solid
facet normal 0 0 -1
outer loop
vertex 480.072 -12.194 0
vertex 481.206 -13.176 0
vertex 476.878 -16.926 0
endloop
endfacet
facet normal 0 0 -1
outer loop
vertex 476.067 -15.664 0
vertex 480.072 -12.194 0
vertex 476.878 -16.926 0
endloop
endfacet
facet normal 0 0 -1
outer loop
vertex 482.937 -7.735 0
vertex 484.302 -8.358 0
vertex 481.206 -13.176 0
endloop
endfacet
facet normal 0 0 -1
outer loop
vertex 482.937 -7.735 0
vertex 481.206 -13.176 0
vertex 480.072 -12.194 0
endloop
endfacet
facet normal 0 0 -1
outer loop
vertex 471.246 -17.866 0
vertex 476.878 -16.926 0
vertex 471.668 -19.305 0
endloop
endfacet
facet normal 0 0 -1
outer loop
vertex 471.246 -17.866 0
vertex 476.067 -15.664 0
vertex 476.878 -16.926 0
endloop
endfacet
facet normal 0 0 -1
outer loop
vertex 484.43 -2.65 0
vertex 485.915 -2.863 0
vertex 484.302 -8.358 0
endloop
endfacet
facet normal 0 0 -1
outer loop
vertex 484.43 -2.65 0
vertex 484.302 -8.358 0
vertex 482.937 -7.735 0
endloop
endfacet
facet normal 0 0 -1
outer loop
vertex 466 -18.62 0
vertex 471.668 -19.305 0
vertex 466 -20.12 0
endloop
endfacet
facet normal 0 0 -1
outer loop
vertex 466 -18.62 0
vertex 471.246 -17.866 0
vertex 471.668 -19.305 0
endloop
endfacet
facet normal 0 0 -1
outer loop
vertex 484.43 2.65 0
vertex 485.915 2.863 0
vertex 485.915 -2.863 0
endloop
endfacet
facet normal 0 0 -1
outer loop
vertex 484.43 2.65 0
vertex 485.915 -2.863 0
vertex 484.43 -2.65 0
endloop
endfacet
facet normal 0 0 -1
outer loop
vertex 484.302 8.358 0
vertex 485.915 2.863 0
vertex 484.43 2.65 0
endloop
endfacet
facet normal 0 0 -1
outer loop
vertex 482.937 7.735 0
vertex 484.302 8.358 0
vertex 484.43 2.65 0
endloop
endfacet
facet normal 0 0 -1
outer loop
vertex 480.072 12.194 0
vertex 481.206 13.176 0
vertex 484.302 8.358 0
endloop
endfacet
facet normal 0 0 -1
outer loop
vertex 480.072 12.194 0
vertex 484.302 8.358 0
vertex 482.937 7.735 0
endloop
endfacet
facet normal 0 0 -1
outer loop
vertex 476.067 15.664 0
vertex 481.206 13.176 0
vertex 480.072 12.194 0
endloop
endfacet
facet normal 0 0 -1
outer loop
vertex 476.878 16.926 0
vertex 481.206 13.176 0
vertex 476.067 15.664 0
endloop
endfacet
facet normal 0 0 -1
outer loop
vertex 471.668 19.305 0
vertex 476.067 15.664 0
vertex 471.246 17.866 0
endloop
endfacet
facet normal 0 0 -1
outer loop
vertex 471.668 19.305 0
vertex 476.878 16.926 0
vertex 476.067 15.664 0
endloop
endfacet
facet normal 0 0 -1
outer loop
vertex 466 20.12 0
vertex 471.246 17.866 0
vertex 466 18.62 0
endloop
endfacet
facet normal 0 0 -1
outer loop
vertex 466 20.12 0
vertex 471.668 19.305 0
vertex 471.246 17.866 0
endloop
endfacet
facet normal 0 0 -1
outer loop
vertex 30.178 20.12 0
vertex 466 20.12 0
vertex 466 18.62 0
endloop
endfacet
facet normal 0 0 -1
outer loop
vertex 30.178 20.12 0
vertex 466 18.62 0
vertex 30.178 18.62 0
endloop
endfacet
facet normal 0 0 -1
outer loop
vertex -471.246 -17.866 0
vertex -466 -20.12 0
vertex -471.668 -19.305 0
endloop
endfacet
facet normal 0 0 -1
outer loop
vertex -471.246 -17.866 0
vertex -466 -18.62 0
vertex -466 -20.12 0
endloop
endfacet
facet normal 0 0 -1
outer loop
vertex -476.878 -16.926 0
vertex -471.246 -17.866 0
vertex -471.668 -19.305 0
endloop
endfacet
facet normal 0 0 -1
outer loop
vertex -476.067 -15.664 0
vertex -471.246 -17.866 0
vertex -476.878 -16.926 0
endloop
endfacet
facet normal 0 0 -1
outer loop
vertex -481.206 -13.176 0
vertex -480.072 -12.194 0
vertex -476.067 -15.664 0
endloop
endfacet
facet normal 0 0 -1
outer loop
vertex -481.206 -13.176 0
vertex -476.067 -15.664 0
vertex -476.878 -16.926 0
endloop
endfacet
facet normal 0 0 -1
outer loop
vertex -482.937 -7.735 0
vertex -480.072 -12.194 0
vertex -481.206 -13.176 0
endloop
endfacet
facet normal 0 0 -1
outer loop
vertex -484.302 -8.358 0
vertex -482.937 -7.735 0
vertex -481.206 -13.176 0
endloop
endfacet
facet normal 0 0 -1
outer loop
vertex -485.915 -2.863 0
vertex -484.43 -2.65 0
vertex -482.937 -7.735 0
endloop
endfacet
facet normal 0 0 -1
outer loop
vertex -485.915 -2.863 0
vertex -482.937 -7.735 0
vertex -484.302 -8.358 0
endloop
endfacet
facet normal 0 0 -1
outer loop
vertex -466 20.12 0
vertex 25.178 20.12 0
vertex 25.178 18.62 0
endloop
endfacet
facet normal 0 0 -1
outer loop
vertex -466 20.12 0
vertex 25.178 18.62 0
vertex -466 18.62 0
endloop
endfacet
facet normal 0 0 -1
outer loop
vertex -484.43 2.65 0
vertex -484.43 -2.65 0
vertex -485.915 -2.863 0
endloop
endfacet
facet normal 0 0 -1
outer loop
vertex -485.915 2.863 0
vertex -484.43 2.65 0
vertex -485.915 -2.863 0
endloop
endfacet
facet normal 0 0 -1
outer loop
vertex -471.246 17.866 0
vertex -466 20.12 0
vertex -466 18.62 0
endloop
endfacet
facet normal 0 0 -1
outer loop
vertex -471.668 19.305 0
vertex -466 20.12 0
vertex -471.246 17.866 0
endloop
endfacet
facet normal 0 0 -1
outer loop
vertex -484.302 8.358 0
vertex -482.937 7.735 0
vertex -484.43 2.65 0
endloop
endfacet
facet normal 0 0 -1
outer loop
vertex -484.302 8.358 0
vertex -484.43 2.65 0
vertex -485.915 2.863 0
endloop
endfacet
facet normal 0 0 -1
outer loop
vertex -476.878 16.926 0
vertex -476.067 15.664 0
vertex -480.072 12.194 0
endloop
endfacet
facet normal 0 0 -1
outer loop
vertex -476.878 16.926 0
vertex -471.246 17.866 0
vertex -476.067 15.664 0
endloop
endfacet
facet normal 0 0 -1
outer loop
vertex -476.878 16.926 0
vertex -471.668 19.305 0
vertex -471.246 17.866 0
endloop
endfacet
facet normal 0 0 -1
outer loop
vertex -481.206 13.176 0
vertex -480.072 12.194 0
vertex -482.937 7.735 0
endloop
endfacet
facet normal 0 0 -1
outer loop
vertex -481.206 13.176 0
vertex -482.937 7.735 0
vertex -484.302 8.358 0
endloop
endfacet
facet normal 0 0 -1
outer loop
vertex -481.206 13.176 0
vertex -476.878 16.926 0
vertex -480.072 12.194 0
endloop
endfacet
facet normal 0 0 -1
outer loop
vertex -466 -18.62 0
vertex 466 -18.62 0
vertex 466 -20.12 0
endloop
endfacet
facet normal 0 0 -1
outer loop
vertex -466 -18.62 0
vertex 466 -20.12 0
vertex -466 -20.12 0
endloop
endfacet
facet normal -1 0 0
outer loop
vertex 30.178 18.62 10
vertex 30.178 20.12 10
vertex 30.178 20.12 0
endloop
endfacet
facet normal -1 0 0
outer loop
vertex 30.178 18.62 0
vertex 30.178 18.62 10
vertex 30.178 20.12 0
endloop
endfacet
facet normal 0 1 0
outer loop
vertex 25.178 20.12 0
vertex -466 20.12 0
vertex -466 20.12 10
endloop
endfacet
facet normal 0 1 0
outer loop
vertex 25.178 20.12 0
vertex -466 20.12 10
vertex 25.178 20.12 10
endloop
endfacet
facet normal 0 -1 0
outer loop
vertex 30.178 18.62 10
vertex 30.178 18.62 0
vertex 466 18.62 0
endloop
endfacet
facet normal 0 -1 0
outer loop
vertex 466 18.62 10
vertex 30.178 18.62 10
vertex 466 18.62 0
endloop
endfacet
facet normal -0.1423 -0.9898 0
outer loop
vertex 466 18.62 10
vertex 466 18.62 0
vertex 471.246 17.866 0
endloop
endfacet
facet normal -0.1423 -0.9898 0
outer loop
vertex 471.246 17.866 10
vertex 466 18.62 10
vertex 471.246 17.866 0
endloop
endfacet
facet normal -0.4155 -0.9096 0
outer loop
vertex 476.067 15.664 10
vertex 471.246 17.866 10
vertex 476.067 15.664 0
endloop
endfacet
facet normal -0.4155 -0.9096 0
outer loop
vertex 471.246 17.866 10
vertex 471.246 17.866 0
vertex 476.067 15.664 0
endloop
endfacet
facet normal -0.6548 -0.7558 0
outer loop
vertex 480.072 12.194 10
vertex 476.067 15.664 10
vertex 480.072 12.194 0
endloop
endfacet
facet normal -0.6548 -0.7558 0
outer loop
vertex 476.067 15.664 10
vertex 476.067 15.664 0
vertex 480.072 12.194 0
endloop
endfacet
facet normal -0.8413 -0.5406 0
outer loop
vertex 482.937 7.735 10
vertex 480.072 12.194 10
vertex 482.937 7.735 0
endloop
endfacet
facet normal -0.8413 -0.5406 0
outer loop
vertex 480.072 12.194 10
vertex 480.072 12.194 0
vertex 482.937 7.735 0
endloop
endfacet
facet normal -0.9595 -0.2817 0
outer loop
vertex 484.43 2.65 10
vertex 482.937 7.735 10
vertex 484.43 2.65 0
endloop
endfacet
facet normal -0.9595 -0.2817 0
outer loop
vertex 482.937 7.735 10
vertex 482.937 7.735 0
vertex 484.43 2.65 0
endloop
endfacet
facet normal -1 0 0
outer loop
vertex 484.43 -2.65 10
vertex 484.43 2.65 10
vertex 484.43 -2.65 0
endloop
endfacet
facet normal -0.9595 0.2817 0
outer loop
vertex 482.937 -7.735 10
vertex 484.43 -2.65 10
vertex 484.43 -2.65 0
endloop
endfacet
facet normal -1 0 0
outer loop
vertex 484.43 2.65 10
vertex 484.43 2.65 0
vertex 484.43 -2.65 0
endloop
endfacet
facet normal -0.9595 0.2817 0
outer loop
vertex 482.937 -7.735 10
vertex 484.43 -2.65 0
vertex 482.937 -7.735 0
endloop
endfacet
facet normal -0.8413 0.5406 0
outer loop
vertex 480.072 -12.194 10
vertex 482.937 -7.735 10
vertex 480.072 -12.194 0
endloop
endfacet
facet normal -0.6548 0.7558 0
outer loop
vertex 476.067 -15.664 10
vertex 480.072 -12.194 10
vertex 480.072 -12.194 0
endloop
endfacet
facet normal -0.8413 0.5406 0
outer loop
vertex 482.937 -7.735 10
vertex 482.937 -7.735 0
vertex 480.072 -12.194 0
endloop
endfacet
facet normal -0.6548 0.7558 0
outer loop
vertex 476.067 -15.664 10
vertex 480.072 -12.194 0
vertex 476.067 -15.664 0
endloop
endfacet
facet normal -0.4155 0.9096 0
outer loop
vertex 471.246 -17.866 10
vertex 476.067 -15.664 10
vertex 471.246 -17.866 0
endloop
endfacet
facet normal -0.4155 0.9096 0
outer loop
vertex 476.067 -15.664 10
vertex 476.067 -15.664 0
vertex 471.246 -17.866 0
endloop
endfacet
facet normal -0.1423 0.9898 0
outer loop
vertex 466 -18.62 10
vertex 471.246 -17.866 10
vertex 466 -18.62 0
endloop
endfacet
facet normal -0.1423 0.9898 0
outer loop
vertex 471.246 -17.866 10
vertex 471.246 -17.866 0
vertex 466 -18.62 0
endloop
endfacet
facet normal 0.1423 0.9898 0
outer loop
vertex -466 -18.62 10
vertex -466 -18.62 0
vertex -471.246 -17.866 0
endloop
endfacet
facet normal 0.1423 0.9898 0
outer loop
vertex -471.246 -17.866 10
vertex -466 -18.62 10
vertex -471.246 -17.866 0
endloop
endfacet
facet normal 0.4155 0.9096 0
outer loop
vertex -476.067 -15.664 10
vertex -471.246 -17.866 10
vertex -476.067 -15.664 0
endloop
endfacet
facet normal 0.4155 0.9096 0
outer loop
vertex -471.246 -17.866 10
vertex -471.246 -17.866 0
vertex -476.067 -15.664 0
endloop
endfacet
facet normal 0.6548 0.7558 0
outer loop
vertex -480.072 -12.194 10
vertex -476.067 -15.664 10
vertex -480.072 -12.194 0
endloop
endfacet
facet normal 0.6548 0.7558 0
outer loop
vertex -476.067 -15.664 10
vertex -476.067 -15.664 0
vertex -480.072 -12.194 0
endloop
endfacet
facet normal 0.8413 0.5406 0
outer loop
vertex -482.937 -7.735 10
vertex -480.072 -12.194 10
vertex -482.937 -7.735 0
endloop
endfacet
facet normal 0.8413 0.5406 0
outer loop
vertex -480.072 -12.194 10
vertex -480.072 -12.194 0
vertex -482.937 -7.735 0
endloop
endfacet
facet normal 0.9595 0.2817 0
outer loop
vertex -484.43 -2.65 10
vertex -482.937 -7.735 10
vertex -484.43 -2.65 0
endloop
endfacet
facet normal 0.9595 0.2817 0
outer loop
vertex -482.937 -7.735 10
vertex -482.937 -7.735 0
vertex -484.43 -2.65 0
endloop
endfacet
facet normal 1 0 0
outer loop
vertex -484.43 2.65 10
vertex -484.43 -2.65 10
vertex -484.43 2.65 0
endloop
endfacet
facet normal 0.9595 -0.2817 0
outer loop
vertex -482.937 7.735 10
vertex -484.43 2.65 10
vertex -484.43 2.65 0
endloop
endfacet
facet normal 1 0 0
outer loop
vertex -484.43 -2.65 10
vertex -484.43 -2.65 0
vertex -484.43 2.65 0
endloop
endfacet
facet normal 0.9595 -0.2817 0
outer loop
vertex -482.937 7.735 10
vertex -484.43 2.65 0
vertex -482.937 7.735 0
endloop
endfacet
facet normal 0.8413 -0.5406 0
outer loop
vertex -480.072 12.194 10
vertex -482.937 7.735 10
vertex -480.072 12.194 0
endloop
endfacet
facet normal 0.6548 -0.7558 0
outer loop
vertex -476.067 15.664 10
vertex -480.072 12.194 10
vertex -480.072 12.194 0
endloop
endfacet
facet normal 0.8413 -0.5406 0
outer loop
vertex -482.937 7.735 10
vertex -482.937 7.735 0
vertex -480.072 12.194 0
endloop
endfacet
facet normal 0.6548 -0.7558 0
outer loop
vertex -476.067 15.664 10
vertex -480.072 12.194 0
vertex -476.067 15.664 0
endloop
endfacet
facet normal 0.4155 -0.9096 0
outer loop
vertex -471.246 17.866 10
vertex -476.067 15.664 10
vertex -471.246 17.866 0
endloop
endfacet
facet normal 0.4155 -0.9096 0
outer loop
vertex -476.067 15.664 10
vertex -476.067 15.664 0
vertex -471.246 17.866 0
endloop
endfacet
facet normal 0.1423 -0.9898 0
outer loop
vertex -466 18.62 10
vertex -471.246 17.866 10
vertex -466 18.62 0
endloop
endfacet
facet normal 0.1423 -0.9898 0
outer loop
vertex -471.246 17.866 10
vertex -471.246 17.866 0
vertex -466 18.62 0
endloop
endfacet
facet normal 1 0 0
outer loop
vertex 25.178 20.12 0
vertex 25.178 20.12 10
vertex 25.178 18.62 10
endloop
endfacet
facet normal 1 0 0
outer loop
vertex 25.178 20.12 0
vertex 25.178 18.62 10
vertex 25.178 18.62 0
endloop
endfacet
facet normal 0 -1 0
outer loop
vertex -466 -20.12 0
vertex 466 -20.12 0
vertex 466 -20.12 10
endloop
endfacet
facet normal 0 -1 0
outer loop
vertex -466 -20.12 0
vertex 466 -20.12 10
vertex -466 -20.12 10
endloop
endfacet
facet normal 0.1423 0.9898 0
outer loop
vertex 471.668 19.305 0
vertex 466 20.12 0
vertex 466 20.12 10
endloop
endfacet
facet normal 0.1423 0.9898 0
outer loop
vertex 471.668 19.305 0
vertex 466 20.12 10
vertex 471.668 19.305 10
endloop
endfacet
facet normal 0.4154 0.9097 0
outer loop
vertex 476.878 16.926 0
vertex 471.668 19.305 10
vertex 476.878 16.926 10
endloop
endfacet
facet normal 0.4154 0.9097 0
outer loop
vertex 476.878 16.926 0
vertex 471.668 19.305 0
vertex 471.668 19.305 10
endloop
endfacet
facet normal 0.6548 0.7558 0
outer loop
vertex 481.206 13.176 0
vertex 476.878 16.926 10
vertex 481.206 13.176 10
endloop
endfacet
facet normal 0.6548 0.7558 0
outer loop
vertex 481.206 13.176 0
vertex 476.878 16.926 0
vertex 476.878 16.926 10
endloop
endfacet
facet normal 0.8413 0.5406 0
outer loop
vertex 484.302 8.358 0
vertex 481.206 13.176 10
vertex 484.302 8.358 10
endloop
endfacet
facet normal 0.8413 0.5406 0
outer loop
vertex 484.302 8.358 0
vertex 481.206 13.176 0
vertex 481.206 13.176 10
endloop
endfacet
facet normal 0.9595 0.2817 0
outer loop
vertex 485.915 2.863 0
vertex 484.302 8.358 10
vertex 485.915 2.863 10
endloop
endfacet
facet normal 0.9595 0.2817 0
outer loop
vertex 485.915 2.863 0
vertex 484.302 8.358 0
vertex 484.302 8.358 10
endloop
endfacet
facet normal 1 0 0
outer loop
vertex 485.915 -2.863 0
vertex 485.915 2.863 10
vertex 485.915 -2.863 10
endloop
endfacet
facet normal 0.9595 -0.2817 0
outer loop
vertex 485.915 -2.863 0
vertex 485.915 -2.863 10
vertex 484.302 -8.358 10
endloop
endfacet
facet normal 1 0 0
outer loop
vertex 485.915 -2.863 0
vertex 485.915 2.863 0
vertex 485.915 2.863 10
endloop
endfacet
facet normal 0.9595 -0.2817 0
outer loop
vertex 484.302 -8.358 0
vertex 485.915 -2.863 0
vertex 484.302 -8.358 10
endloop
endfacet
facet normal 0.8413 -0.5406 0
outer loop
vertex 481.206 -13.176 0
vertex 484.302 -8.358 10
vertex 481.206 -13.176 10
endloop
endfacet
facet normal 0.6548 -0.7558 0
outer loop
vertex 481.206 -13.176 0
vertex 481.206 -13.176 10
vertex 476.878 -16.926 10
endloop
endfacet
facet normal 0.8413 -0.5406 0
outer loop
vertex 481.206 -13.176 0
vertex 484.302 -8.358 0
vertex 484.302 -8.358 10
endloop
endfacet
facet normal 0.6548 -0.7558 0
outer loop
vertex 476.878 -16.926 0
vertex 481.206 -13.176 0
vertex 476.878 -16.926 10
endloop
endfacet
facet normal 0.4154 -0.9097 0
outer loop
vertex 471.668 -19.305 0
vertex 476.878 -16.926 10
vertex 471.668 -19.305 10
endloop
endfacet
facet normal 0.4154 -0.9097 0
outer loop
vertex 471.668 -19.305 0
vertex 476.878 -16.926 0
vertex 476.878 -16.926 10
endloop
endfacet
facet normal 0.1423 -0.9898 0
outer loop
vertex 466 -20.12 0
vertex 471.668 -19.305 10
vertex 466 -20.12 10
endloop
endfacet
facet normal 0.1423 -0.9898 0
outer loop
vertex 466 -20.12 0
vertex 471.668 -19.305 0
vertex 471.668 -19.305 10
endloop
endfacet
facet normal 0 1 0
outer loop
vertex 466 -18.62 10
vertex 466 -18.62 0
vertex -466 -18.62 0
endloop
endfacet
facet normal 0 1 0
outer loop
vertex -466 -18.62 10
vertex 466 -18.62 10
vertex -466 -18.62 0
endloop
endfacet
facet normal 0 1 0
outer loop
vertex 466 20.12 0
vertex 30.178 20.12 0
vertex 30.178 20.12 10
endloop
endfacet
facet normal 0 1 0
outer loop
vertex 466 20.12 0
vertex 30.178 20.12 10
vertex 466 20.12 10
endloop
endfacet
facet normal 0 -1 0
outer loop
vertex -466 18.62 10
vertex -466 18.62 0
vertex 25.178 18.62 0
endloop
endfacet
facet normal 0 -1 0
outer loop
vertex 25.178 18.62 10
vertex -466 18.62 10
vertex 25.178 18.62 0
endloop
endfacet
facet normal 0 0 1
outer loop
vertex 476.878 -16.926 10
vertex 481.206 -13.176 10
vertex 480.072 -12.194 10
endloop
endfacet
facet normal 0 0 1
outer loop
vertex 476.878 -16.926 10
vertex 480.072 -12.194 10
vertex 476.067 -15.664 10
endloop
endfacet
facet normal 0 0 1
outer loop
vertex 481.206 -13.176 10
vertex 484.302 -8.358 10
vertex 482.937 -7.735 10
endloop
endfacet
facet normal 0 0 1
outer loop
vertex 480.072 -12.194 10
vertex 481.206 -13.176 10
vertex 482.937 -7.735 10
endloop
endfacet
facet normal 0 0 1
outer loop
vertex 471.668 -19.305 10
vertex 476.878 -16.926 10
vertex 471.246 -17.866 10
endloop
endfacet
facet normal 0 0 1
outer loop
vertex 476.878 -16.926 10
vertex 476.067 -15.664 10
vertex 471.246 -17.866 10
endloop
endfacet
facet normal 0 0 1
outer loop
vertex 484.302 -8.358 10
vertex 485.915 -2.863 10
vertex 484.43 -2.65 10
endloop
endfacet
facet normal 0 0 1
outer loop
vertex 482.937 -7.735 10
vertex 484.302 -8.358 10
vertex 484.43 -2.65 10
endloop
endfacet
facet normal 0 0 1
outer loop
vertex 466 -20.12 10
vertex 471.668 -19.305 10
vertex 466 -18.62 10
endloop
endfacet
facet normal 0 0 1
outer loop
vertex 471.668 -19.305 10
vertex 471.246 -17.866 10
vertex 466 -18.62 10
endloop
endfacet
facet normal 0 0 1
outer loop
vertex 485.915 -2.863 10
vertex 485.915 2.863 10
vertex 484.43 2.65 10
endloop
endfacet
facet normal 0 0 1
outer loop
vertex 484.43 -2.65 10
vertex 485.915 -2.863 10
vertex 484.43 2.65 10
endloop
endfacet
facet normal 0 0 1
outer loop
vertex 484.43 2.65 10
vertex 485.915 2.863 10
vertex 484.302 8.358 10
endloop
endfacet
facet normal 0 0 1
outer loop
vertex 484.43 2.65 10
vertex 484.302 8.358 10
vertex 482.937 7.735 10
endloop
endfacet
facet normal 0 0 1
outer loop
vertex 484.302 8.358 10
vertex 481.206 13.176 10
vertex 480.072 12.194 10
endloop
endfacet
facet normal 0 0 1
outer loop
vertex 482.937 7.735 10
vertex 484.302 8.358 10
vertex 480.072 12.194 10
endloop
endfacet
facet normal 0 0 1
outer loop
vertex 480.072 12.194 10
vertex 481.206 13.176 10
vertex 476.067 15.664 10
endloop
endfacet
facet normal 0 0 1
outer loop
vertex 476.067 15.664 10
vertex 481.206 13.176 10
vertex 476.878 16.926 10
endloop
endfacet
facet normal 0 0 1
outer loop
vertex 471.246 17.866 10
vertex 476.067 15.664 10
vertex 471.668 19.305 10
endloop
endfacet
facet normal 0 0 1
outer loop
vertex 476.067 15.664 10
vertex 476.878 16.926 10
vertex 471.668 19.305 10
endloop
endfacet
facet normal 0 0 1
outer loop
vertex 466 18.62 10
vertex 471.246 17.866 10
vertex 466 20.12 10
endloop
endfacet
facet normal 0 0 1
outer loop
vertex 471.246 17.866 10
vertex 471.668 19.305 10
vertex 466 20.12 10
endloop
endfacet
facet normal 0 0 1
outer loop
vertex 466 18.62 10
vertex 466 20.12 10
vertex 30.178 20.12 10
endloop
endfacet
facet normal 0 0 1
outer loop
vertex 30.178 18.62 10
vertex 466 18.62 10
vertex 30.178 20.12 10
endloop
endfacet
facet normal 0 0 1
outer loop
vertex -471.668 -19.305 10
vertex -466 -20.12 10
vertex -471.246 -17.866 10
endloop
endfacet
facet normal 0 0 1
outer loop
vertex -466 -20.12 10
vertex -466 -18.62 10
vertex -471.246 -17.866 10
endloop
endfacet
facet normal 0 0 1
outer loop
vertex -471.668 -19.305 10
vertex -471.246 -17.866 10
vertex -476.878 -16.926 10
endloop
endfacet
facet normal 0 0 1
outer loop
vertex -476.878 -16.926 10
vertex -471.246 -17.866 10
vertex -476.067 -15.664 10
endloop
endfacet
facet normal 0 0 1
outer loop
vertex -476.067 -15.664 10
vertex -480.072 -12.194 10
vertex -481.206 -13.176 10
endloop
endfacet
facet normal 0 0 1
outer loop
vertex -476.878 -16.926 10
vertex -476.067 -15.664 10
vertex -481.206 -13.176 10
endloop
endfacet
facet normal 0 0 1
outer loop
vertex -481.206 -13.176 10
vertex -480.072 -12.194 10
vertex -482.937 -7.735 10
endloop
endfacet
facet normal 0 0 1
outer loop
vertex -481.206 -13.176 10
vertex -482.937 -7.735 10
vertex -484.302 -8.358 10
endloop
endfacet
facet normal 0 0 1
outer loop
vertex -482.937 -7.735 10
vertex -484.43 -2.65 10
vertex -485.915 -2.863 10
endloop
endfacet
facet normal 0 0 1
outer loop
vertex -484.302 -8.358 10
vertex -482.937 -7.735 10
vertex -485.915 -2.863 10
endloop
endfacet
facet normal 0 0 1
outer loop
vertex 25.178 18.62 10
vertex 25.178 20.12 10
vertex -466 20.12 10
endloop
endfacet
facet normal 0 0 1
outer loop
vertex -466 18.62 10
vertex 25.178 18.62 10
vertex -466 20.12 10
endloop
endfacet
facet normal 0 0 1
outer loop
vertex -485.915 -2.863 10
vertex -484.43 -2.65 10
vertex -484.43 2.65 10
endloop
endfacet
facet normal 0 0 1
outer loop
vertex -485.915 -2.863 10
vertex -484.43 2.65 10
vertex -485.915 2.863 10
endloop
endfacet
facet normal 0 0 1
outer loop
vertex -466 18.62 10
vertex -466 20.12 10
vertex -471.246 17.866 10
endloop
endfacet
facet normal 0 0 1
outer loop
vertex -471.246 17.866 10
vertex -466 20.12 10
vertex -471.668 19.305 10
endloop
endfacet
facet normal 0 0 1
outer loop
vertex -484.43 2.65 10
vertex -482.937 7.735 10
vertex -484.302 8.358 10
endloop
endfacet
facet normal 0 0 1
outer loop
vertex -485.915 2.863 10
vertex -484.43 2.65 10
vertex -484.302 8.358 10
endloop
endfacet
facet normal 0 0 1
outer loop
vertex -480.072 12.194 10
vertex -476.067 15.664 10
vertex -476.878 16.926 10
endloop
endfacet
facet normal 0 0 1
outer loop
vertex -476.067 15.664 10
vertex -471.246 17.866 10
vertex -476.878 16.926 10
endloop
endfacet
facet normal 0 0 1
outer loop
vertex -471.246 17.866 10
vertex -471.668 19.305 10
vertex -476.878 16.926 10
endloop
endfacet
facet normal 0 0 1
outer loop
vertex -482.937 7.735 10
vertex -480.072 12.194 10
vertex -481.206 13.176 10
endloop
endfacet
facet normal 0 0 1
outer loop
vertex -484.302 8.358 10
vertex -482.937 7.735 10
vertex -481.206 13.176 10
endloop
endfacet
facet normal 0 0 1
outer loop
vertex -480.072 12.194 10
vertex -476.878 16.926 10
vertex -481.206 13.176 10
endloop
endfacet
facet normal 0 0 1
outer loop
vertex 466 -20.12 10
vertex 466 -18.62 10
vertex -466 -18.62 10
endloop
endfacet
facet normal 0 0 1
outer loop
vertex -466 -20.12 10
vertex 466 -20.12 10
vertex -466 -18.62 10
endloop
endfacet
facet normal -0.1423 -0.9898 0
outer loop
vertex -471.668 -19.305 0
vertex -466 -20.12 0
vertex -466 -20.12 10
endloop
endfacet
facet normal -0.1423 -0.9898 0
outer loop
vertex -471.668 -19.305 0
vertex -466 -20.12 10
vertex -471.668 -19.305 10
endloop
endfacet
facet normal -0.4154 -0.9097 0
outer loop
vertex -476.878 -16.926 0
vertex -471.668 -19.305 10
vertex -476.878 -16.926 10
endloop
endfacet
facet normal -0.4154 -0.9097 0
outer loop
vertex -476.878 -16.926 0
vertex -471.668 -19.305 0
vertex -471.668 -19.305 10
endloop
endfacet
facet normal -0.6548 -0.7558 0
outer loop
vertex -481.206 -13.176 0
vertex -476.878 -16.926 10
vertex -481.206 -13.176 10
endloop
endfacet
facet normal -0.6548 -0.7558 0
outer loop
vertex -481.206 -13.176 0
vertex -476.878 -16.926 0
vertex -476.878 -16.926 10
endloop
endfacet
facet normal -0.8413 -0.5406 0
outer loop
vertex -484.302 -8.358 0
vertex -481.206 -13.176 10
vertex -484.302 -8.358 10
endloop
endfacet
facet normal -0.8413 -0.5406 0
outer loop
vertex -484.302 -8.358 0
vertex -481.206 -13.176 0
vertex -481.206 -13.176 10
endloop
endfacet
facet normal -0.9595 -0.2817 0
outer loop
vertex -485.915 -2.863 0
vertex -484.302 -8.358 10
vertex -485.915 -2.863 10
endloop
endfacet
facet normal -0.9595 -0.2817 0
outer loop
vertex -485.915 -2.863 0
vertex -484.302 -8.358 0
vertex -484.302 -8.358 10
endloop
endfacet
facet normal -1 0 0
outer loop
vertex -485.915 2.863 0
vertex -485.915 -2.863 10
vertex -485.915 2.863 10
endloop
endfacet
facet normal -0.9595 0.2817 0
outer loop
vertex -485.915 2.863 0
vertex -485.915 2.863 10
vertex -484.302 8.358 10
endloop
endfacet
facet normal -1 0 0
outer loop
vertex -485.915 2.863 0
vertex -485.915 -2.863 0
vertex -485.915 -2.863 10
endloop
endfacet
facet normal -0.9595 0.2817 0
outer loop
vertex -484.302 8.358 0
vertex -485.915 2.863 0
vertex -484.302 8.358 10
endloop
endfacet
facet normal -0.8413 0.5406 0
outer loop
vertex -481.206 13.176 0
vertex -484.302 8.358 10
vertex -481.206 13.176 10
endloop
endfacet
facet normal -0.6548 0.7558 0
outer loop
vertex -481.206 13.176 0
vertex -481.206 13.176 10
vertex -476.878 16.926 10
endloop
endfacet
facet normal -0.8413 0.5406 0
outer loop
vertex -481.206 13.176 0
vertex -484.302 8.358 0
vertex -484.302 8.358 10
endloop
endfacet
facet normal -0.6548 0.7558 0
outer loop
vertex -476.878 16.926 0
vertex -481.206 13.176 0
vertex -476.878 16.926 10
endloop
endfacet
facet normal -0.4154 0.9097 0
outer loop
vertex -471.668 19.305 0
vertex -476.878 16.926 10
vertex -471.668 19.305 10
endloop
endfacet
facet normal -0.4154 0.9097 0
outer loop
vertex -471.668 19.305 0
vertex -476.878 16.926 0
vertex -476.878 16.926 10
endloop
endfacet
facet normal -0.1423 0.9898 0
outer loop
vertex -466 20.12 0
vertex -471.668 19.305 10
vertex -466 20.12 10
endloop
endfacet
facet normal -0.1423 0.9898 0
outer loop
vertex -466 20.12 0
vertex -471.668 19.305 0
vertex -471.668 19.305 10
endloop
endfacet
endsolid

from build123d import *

# Parameters (mm, degrees)
EXTRUDE_1_DEPTH     = 10
CUT_EXTRUDE_1_REACH = 42.24
SKETCH_2_W          = 5
SKETCH_2_H          = 10


with BuildPart() as part:
    # 草圖1 → 伸長1 (new body)
    with BuildSketch(Plane.XY):
        with BuildLine():
            Line((-466, 20.12), (466, 20.12))
            ThreePointArc((466, 20.12), (486.12, 0), (466, -20.12))
            Line((466, -20.12), (-466, -20.12))
            ThreePointArc((-466, -20.12), (-486.12, 0), (-466, 20.12))
        make_face()
        with BuildLine():
            Line((-466, 18.62), (466, 18.62))
            ThreePointArc((466, 18.62), (484.62, 0), (466, -18.62))
            Line((466, -18.62), (-466, -18.62))
            ThreePointArc((-466, -18.62), (-484.62, 0), (-466, 18.62))
        make_face(mode=Mode.SUBTRACT)
    extrude(amount=EXTRUDE_1_DEPTH)

    # 草圖2 → 除料-伸長1 (cut, up to next)
    with BuildSketch(Plane(origin=(0, 20.12, 0), x_dir=(1, 0, 0), z_dir=(0, 1, 0)), mode=Mode.PRIVATE) as cut_extrude_1_sk1:
        with Locations((27.677656209, -5)):
            Rectangle(SKETCH_2_W, SKETCH_2_H)
    cut_extrude_1_tool1 = extrude(cut_extrude_1_sk1.sketch, amount=-CUT_EXTRUDE_1_REACH, mode=Mode.PRIVATE) & part.part
    add(cut_extrude_1_tool1.solids().sort_by_distance((27.677656, 20.12, 5))[0], mode=Mode.SUBTRACT)


solid = part.part
